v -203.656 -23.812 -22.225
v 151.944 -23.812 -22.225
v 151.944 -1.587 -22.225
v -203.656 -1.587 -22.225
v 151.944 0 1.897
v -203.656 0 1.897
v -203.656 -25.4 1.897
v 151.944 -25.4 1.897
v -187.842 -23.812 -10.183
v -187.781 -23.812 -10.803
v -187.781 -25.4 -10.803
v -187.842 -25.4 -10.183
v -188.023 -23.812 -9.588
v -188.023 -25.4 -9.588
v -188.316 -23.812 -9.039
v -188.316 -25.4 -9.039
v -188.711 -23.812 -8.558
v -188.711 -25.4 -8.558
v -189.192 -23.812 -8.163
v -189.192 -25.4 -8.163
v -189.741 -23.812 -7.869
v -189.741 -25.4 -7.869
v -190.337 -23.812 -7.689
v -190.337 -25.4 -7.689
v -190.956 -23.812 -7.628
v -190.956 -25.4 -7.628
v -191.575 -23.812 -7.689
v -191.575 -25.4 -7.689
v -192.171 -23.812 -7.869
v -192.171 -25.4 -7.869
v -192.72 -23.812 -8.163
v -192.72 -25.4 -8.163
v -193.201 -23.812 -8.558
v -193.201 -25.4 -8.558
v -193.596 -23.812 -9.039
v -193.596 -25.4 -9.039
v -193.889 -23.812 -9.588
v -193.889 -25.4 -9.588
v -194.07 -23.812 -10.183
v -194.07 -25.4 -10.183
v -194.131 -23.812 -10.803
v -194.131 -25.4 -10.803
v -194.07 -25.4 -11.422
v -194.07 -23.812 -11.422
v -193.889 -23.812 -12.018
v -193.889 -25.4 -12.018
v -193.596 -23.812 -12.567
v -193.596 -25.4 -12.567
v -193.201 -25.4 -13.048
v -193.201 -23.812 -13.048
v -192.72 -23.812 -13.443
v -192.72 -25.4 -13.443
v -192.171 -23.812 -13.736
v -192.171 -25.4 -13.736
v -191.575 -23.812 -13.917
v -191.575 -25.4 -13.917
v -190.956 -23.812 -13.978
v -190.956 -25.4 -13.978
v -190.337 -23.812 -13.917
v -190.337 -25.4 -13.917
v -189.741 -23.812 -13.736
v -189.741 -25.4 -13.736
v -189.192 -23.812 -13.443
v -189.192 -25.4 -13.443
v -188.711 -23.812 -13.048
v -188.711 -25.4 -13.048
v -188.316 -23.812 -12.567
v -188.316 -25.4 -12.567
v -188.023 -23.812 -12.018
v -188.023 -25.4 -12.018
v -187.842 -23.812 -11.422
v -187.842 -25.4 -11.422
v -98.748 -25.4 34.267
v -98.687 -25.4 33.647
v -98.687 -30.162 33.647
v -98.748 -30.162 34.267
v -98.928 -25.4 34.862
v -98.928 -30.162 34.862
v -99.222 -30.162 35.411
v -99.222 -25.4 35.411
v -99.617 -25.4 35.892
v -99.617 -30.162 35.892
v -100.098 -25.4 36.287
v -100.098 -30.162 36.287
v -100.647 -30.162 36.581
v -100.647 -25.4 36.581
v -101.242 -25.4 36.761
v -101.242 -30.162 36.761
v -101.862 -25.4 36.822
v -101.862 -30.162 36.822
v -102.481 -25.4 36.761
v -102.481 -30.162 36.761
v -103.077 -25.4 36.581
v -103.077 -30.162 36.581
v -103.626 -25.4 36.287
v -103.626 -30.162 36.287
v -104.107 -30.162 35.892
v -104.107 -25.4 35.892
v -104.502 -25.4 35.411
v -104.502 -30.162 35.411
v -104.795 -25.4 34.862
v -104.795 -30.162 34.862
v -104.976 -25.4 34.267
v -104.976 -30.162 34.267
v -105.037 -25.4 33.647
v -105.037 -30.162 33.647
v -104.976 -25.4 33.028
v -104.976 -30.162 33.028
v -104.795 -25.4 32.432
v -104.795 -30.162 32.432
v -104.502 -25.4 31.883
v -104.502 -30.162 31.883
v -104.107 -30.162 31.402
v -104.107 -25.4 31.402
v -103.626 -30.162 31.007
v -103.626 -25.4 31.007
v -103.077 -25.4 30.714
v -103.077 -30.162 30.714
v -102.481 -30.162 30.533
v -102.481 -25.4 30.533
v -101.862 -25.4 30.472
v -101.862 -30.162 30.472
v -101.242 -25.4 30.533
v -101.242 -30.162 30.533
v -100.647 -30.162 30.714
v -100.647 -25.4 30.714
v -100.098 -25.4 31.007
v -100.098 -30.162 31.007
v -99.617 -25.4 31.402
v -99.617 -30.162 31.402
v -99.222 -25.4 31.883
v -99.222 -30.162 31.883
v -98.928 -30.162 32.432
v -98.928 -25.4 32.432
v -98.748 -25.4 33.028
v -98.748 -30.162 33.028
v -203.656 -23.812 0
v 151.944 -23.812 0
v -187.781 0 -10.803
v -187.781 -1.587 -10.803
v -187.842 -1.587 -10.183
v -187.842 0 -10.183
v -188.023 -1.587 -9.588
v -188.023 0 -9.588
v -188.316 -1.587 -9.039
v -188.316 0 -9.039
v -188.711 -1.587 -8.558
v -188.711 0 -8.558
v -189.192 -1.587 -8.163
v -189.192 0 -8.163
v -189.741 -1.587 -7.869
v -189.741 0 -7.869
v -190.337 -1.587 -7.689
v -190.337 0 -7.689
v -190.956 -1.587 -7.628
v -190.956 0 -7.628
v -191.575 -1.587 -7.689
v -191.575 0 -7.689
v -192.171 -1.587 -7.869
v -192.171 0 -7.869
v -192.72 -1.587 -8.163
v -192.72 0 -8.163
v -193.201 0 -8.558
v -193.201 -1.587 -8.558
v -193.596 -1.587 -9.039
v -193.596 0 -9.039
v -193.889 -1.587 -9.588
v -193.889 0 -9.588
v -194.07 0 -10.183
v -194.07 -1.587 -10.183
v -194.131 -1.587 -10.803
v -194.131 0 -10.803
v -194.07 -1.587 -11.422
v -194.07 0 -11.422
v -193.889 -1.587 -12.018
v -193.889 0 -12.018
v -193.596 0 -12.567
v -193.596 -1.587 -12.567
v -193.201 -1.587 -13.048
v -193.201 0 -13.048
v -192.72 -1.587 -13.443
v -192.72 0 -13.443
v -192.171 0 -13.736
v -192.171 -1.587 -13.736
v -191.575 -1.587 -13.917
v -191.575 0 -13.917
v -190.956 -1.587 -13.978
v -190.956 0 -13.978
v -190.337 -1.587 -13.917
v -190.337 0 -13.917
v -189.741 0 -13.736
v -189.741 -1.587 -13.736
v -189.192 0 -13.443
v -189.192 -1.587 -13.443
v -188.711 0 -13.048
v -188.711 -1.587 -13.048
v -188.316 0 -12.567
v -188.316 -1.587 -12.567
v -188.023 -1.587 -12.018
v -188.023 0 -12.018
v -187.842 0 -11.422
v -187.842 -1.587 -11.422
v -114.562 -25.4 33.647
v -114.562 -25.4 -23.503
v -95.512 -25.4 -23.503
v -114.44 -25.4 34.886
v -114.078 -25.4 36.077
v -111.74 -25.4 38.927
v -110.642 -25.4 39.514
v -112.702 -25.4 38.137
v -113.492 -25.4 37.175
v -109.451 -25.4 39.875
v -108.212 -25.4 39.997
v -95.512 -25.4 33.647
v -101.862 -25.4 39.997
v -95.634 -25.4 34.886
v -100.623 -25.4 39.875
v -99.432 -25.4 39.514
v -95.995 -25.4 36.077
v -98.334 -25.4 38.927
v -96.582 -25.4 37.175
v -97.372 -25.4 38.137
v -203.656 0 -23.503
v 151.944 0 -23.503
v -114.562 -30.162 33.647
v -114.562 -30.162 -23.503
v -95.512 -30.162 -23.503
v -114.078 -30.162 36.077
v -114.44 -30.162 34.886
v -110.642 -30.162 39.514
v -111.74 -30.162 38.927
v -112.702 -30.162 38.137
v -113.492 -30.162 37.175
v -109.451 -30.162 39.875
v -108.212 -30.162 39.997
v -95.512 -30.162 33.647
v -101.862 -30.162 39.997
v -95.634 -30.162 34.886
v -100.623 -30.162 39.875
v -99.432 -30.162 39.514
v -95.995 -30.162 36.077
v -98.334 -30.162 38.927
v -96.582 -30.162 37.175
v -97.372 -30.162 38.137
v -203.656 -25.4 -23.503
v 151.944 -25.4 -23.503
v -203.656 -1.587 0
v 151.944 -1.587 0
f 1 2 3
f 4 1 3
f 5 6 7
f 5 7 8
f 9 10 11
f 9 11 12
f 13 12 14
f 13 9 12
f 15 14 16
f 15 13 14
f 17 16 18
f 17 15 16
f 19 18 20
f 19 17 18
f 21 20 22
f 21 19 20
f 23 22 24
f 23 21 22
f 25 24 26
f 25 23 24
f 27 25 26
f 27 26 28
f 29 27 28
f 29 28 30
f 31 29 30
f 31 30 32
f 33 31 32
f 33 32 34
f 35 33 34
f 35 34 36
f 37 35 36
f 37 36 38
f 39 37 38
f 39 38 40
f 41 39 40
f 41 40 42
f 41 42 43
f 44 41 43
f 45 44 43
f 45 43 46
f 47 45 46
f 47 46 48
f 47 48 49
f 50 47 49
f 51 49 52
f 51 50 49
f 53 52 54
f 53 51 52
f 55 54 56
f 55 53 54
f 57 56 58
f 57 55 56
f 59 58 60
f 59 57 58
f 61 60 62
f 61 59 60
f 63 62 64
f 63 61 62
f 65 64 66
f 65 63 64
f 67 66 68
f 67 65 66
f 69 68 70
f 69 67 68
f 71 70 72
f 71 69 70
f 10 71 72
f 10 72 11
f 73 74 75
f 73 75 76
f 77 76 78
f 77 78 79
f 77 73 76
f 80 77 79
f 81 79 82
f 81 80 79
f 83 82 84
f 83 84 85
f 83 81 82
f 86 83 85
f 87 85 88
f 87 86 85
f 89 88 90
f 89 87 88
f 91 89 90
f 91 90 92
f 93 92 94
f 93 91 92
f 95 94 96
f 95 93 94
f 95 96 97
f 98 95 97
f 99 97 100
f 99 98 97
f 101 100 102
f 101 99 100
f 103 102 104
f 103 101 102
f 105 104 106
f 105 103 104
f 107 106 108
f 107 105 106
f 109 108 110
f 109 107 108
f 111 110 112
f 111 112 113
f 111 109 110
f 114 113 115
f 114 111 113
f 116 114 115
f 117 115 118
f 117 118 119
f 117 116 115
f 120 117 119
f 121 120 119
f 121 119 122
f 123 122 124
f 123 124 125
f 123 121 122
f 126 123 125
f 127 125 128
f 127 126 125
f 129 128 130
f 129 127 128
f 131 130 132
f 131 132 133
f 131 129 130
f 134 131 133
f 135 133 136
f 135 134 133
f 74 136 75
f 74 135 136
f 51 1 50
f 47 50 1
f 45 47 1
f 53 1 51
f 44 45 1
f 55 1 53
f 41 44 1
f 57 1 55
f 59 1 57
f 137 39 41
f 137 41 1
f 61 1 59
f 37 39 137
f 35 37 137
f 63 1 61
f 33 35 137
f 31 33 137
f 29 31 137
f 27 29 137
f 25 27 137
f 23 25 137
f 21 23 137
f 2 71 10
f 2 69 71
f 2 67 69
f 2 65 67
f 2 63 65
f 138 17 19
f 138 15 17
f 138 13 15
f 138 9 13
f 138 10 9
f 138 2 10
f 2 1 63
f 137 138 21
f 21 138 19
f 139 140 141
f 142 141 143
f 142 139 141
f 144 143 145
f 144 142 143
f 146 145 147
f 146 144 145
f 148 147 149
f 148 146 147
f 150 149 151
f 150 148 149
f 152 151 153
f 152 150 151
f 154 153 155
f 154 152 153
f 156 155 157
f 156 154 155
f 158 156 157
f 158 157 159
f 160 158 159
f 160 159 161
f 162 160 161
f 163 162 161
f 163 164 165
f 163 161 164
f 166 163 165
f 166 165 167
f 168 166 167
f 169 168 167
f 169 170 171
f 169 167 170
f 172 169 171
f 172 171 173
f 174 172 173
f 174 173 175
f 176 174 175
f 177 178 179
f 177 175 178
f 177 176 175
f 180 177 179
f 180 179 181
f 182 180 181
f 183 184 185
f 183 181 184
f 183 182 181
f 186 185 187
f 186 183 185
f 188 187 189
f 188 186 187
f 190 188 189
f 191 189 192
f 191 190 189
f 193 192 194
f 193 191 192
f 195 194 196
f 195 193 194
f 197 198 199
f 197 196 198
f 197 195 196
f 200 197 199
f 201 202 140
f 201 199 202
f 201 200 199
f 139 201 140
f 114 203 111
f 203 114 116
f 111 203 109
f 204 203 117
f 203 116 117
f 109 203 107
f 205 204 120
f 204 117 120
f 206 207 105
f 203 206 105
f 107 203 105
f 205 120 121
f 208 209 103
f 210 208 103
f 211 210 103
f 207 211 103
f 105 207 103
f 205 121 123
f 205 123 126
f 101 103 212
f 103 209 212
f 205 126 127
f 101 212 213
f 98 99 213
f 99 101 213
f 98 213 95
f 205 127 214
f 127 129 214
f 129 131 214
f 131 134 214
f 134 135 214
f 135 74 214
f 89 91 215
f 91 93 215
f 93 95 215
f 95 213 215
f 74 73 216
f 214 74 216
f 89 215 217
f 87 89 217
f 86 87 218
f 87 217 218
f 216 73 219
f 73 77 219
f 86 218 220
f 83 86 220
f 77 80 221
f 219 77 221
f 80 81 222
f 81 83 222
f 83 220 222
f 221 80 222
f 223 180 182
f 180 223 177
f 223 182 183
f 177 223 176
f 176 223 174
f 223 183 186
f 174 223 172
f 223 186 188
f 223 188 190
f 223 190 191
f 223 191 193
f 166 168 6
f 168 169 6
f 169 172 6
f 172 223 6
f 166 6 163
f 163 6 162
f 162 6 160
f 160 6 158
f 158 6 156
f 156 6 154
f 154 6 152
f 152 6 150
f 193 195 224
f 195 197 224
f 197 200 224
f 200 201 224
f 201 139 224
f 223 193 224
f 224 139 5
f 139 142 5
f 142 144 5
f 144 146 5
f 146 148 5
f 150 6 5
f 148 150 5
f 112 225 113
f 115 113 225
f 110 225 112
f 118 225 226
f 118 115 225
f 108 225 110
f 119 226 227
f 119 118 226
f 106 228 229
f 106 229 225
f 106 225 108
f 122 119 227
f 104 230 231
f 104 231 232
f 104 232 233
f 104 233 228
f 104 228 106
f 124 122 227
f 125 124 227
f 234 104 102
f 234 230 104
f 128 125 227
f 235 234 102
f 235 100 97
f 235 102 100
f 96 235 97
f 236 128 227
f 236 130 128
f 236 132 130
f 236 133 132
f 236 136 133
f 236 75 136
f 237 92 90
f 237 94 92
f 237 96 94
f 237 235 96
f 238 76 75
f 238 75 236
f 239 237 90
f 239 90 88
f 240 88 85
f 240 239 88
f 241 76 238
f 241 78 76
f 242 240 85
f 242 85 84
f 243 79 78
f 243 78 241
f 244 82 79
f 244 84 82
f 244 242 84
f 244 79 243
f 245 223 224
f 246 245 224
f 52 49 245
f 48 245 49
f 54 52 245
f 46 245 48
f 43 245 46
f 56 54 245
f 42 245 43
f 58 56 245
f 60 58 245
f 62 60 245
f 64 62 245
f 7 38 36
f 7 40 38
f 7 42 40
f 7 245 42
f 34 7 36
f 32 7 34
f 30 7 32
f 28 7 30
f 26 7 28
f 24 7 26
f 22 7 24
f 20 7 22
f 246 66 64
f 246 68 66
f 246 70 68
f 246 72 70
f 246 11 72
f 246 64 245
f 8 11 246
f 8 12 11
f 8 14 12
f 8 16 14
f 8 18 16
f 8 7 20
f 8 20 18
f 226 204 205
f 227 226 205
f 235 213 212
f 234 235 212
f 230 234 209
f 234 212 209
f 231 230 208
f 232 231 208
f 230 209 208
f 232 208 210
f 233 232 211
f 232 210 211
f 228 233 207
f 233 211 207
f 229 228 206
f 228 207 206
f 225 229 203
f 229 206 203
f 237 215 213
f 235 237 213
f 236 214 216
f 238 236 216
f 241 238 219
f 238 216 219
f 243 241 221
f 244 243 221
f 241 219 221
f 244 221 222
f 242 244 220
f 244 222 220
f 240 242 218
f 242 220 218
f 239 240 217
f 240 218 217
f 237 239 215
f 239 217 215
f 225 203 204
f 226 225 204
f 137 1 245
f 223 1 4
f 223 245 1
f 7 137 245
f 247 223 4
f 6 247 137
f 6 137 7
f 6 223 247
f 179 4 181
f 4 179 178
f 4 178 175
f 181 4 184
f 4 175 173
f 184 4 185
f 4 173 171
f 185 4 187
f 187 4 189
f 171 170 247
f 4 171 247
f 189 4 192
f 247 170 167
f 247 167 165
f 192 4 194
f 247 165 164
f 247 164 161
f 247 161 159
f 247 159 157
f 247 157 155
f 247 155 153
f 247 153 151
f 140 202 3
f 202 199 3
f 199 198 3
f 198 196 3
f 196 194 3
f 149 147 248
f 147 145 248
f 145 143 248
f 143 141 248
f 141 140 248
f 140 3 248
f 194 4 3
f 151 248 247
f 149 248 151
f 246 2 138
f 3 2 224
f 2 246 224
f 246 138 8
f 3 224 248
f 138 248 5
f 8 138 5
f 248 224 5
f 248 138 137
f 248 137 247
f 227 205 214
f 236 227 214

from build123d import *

# Parameters (mm, degrees)
F0_W     = 355.6
F0_H     = 25.4
F0_R     = 3.175
F1_DEPTH = 25.4
F2_W     = 22.225
F2_H     = 22.225
F3_DEPTH = 355.601
F4_R     = 3.175
F4_W     = 19.05
F4_H     = 25.4
F5_DEPTH = 4.7625


with BuildPart() as f1:
    # F0 (on Front) → F1 (new body)
    with BuildSketch(Plane.XZ):
        with Locations((-25.856045, -10.802652)):
            Rectangle(F0_W, F0_H)
        with Locations((-190.956045, -10.802652)):
            Circle(F0_R, mode=Mode.SUBTRACT)
    extrude(amount=F1_DEPTH)

    # F2 (on face) → F3 (cut, through all)
    with BuildSketch(Plane.YZ.offset(151.943955)):
        with Locations((-12.7, -11.1125)):
            Rectangle(F2_W, F2_H)
    extrude(amount=-F3_DEPTH, mode=Mode.SUBTRACT)


with BuildPart() as f5:
    # F4 (on face) → F5 (new body)
    with BuildSketch(Plane.XZ.offset(25.4)):
        with BuildLine():
            Line((-114.561781, 33.647348), (-114.561781, 1.897348))
            Line((-114.561781, 1.897348), (-95.511781, 1.897348))
            Line((-95.511781, 1.897348), (-95.511781, 33.647348))
            ThreePointArc((-95.511781, 33.647348), (-97.371653, 38.137476), (-101.861781, 39.997348))
            Line((-101.861781, 39.997348), (-108.211781, 39.997348))
            ThreePointArc((-108.211781, 39.997348), (-112.701909, 38.137476), (-114.561781, 33.647348))
        make_face()
        with Locations((-101.861781, 33.647348)):
            Circle(F4_R, mode=Mode.SUBTRACT)
        with Locations((-105.036781, -10.802652)):
            Rectangle(F4_W, F4_H)
    extrude(amount=F5_DEPTH)


solid = Compound([f1.part, f5.part])
